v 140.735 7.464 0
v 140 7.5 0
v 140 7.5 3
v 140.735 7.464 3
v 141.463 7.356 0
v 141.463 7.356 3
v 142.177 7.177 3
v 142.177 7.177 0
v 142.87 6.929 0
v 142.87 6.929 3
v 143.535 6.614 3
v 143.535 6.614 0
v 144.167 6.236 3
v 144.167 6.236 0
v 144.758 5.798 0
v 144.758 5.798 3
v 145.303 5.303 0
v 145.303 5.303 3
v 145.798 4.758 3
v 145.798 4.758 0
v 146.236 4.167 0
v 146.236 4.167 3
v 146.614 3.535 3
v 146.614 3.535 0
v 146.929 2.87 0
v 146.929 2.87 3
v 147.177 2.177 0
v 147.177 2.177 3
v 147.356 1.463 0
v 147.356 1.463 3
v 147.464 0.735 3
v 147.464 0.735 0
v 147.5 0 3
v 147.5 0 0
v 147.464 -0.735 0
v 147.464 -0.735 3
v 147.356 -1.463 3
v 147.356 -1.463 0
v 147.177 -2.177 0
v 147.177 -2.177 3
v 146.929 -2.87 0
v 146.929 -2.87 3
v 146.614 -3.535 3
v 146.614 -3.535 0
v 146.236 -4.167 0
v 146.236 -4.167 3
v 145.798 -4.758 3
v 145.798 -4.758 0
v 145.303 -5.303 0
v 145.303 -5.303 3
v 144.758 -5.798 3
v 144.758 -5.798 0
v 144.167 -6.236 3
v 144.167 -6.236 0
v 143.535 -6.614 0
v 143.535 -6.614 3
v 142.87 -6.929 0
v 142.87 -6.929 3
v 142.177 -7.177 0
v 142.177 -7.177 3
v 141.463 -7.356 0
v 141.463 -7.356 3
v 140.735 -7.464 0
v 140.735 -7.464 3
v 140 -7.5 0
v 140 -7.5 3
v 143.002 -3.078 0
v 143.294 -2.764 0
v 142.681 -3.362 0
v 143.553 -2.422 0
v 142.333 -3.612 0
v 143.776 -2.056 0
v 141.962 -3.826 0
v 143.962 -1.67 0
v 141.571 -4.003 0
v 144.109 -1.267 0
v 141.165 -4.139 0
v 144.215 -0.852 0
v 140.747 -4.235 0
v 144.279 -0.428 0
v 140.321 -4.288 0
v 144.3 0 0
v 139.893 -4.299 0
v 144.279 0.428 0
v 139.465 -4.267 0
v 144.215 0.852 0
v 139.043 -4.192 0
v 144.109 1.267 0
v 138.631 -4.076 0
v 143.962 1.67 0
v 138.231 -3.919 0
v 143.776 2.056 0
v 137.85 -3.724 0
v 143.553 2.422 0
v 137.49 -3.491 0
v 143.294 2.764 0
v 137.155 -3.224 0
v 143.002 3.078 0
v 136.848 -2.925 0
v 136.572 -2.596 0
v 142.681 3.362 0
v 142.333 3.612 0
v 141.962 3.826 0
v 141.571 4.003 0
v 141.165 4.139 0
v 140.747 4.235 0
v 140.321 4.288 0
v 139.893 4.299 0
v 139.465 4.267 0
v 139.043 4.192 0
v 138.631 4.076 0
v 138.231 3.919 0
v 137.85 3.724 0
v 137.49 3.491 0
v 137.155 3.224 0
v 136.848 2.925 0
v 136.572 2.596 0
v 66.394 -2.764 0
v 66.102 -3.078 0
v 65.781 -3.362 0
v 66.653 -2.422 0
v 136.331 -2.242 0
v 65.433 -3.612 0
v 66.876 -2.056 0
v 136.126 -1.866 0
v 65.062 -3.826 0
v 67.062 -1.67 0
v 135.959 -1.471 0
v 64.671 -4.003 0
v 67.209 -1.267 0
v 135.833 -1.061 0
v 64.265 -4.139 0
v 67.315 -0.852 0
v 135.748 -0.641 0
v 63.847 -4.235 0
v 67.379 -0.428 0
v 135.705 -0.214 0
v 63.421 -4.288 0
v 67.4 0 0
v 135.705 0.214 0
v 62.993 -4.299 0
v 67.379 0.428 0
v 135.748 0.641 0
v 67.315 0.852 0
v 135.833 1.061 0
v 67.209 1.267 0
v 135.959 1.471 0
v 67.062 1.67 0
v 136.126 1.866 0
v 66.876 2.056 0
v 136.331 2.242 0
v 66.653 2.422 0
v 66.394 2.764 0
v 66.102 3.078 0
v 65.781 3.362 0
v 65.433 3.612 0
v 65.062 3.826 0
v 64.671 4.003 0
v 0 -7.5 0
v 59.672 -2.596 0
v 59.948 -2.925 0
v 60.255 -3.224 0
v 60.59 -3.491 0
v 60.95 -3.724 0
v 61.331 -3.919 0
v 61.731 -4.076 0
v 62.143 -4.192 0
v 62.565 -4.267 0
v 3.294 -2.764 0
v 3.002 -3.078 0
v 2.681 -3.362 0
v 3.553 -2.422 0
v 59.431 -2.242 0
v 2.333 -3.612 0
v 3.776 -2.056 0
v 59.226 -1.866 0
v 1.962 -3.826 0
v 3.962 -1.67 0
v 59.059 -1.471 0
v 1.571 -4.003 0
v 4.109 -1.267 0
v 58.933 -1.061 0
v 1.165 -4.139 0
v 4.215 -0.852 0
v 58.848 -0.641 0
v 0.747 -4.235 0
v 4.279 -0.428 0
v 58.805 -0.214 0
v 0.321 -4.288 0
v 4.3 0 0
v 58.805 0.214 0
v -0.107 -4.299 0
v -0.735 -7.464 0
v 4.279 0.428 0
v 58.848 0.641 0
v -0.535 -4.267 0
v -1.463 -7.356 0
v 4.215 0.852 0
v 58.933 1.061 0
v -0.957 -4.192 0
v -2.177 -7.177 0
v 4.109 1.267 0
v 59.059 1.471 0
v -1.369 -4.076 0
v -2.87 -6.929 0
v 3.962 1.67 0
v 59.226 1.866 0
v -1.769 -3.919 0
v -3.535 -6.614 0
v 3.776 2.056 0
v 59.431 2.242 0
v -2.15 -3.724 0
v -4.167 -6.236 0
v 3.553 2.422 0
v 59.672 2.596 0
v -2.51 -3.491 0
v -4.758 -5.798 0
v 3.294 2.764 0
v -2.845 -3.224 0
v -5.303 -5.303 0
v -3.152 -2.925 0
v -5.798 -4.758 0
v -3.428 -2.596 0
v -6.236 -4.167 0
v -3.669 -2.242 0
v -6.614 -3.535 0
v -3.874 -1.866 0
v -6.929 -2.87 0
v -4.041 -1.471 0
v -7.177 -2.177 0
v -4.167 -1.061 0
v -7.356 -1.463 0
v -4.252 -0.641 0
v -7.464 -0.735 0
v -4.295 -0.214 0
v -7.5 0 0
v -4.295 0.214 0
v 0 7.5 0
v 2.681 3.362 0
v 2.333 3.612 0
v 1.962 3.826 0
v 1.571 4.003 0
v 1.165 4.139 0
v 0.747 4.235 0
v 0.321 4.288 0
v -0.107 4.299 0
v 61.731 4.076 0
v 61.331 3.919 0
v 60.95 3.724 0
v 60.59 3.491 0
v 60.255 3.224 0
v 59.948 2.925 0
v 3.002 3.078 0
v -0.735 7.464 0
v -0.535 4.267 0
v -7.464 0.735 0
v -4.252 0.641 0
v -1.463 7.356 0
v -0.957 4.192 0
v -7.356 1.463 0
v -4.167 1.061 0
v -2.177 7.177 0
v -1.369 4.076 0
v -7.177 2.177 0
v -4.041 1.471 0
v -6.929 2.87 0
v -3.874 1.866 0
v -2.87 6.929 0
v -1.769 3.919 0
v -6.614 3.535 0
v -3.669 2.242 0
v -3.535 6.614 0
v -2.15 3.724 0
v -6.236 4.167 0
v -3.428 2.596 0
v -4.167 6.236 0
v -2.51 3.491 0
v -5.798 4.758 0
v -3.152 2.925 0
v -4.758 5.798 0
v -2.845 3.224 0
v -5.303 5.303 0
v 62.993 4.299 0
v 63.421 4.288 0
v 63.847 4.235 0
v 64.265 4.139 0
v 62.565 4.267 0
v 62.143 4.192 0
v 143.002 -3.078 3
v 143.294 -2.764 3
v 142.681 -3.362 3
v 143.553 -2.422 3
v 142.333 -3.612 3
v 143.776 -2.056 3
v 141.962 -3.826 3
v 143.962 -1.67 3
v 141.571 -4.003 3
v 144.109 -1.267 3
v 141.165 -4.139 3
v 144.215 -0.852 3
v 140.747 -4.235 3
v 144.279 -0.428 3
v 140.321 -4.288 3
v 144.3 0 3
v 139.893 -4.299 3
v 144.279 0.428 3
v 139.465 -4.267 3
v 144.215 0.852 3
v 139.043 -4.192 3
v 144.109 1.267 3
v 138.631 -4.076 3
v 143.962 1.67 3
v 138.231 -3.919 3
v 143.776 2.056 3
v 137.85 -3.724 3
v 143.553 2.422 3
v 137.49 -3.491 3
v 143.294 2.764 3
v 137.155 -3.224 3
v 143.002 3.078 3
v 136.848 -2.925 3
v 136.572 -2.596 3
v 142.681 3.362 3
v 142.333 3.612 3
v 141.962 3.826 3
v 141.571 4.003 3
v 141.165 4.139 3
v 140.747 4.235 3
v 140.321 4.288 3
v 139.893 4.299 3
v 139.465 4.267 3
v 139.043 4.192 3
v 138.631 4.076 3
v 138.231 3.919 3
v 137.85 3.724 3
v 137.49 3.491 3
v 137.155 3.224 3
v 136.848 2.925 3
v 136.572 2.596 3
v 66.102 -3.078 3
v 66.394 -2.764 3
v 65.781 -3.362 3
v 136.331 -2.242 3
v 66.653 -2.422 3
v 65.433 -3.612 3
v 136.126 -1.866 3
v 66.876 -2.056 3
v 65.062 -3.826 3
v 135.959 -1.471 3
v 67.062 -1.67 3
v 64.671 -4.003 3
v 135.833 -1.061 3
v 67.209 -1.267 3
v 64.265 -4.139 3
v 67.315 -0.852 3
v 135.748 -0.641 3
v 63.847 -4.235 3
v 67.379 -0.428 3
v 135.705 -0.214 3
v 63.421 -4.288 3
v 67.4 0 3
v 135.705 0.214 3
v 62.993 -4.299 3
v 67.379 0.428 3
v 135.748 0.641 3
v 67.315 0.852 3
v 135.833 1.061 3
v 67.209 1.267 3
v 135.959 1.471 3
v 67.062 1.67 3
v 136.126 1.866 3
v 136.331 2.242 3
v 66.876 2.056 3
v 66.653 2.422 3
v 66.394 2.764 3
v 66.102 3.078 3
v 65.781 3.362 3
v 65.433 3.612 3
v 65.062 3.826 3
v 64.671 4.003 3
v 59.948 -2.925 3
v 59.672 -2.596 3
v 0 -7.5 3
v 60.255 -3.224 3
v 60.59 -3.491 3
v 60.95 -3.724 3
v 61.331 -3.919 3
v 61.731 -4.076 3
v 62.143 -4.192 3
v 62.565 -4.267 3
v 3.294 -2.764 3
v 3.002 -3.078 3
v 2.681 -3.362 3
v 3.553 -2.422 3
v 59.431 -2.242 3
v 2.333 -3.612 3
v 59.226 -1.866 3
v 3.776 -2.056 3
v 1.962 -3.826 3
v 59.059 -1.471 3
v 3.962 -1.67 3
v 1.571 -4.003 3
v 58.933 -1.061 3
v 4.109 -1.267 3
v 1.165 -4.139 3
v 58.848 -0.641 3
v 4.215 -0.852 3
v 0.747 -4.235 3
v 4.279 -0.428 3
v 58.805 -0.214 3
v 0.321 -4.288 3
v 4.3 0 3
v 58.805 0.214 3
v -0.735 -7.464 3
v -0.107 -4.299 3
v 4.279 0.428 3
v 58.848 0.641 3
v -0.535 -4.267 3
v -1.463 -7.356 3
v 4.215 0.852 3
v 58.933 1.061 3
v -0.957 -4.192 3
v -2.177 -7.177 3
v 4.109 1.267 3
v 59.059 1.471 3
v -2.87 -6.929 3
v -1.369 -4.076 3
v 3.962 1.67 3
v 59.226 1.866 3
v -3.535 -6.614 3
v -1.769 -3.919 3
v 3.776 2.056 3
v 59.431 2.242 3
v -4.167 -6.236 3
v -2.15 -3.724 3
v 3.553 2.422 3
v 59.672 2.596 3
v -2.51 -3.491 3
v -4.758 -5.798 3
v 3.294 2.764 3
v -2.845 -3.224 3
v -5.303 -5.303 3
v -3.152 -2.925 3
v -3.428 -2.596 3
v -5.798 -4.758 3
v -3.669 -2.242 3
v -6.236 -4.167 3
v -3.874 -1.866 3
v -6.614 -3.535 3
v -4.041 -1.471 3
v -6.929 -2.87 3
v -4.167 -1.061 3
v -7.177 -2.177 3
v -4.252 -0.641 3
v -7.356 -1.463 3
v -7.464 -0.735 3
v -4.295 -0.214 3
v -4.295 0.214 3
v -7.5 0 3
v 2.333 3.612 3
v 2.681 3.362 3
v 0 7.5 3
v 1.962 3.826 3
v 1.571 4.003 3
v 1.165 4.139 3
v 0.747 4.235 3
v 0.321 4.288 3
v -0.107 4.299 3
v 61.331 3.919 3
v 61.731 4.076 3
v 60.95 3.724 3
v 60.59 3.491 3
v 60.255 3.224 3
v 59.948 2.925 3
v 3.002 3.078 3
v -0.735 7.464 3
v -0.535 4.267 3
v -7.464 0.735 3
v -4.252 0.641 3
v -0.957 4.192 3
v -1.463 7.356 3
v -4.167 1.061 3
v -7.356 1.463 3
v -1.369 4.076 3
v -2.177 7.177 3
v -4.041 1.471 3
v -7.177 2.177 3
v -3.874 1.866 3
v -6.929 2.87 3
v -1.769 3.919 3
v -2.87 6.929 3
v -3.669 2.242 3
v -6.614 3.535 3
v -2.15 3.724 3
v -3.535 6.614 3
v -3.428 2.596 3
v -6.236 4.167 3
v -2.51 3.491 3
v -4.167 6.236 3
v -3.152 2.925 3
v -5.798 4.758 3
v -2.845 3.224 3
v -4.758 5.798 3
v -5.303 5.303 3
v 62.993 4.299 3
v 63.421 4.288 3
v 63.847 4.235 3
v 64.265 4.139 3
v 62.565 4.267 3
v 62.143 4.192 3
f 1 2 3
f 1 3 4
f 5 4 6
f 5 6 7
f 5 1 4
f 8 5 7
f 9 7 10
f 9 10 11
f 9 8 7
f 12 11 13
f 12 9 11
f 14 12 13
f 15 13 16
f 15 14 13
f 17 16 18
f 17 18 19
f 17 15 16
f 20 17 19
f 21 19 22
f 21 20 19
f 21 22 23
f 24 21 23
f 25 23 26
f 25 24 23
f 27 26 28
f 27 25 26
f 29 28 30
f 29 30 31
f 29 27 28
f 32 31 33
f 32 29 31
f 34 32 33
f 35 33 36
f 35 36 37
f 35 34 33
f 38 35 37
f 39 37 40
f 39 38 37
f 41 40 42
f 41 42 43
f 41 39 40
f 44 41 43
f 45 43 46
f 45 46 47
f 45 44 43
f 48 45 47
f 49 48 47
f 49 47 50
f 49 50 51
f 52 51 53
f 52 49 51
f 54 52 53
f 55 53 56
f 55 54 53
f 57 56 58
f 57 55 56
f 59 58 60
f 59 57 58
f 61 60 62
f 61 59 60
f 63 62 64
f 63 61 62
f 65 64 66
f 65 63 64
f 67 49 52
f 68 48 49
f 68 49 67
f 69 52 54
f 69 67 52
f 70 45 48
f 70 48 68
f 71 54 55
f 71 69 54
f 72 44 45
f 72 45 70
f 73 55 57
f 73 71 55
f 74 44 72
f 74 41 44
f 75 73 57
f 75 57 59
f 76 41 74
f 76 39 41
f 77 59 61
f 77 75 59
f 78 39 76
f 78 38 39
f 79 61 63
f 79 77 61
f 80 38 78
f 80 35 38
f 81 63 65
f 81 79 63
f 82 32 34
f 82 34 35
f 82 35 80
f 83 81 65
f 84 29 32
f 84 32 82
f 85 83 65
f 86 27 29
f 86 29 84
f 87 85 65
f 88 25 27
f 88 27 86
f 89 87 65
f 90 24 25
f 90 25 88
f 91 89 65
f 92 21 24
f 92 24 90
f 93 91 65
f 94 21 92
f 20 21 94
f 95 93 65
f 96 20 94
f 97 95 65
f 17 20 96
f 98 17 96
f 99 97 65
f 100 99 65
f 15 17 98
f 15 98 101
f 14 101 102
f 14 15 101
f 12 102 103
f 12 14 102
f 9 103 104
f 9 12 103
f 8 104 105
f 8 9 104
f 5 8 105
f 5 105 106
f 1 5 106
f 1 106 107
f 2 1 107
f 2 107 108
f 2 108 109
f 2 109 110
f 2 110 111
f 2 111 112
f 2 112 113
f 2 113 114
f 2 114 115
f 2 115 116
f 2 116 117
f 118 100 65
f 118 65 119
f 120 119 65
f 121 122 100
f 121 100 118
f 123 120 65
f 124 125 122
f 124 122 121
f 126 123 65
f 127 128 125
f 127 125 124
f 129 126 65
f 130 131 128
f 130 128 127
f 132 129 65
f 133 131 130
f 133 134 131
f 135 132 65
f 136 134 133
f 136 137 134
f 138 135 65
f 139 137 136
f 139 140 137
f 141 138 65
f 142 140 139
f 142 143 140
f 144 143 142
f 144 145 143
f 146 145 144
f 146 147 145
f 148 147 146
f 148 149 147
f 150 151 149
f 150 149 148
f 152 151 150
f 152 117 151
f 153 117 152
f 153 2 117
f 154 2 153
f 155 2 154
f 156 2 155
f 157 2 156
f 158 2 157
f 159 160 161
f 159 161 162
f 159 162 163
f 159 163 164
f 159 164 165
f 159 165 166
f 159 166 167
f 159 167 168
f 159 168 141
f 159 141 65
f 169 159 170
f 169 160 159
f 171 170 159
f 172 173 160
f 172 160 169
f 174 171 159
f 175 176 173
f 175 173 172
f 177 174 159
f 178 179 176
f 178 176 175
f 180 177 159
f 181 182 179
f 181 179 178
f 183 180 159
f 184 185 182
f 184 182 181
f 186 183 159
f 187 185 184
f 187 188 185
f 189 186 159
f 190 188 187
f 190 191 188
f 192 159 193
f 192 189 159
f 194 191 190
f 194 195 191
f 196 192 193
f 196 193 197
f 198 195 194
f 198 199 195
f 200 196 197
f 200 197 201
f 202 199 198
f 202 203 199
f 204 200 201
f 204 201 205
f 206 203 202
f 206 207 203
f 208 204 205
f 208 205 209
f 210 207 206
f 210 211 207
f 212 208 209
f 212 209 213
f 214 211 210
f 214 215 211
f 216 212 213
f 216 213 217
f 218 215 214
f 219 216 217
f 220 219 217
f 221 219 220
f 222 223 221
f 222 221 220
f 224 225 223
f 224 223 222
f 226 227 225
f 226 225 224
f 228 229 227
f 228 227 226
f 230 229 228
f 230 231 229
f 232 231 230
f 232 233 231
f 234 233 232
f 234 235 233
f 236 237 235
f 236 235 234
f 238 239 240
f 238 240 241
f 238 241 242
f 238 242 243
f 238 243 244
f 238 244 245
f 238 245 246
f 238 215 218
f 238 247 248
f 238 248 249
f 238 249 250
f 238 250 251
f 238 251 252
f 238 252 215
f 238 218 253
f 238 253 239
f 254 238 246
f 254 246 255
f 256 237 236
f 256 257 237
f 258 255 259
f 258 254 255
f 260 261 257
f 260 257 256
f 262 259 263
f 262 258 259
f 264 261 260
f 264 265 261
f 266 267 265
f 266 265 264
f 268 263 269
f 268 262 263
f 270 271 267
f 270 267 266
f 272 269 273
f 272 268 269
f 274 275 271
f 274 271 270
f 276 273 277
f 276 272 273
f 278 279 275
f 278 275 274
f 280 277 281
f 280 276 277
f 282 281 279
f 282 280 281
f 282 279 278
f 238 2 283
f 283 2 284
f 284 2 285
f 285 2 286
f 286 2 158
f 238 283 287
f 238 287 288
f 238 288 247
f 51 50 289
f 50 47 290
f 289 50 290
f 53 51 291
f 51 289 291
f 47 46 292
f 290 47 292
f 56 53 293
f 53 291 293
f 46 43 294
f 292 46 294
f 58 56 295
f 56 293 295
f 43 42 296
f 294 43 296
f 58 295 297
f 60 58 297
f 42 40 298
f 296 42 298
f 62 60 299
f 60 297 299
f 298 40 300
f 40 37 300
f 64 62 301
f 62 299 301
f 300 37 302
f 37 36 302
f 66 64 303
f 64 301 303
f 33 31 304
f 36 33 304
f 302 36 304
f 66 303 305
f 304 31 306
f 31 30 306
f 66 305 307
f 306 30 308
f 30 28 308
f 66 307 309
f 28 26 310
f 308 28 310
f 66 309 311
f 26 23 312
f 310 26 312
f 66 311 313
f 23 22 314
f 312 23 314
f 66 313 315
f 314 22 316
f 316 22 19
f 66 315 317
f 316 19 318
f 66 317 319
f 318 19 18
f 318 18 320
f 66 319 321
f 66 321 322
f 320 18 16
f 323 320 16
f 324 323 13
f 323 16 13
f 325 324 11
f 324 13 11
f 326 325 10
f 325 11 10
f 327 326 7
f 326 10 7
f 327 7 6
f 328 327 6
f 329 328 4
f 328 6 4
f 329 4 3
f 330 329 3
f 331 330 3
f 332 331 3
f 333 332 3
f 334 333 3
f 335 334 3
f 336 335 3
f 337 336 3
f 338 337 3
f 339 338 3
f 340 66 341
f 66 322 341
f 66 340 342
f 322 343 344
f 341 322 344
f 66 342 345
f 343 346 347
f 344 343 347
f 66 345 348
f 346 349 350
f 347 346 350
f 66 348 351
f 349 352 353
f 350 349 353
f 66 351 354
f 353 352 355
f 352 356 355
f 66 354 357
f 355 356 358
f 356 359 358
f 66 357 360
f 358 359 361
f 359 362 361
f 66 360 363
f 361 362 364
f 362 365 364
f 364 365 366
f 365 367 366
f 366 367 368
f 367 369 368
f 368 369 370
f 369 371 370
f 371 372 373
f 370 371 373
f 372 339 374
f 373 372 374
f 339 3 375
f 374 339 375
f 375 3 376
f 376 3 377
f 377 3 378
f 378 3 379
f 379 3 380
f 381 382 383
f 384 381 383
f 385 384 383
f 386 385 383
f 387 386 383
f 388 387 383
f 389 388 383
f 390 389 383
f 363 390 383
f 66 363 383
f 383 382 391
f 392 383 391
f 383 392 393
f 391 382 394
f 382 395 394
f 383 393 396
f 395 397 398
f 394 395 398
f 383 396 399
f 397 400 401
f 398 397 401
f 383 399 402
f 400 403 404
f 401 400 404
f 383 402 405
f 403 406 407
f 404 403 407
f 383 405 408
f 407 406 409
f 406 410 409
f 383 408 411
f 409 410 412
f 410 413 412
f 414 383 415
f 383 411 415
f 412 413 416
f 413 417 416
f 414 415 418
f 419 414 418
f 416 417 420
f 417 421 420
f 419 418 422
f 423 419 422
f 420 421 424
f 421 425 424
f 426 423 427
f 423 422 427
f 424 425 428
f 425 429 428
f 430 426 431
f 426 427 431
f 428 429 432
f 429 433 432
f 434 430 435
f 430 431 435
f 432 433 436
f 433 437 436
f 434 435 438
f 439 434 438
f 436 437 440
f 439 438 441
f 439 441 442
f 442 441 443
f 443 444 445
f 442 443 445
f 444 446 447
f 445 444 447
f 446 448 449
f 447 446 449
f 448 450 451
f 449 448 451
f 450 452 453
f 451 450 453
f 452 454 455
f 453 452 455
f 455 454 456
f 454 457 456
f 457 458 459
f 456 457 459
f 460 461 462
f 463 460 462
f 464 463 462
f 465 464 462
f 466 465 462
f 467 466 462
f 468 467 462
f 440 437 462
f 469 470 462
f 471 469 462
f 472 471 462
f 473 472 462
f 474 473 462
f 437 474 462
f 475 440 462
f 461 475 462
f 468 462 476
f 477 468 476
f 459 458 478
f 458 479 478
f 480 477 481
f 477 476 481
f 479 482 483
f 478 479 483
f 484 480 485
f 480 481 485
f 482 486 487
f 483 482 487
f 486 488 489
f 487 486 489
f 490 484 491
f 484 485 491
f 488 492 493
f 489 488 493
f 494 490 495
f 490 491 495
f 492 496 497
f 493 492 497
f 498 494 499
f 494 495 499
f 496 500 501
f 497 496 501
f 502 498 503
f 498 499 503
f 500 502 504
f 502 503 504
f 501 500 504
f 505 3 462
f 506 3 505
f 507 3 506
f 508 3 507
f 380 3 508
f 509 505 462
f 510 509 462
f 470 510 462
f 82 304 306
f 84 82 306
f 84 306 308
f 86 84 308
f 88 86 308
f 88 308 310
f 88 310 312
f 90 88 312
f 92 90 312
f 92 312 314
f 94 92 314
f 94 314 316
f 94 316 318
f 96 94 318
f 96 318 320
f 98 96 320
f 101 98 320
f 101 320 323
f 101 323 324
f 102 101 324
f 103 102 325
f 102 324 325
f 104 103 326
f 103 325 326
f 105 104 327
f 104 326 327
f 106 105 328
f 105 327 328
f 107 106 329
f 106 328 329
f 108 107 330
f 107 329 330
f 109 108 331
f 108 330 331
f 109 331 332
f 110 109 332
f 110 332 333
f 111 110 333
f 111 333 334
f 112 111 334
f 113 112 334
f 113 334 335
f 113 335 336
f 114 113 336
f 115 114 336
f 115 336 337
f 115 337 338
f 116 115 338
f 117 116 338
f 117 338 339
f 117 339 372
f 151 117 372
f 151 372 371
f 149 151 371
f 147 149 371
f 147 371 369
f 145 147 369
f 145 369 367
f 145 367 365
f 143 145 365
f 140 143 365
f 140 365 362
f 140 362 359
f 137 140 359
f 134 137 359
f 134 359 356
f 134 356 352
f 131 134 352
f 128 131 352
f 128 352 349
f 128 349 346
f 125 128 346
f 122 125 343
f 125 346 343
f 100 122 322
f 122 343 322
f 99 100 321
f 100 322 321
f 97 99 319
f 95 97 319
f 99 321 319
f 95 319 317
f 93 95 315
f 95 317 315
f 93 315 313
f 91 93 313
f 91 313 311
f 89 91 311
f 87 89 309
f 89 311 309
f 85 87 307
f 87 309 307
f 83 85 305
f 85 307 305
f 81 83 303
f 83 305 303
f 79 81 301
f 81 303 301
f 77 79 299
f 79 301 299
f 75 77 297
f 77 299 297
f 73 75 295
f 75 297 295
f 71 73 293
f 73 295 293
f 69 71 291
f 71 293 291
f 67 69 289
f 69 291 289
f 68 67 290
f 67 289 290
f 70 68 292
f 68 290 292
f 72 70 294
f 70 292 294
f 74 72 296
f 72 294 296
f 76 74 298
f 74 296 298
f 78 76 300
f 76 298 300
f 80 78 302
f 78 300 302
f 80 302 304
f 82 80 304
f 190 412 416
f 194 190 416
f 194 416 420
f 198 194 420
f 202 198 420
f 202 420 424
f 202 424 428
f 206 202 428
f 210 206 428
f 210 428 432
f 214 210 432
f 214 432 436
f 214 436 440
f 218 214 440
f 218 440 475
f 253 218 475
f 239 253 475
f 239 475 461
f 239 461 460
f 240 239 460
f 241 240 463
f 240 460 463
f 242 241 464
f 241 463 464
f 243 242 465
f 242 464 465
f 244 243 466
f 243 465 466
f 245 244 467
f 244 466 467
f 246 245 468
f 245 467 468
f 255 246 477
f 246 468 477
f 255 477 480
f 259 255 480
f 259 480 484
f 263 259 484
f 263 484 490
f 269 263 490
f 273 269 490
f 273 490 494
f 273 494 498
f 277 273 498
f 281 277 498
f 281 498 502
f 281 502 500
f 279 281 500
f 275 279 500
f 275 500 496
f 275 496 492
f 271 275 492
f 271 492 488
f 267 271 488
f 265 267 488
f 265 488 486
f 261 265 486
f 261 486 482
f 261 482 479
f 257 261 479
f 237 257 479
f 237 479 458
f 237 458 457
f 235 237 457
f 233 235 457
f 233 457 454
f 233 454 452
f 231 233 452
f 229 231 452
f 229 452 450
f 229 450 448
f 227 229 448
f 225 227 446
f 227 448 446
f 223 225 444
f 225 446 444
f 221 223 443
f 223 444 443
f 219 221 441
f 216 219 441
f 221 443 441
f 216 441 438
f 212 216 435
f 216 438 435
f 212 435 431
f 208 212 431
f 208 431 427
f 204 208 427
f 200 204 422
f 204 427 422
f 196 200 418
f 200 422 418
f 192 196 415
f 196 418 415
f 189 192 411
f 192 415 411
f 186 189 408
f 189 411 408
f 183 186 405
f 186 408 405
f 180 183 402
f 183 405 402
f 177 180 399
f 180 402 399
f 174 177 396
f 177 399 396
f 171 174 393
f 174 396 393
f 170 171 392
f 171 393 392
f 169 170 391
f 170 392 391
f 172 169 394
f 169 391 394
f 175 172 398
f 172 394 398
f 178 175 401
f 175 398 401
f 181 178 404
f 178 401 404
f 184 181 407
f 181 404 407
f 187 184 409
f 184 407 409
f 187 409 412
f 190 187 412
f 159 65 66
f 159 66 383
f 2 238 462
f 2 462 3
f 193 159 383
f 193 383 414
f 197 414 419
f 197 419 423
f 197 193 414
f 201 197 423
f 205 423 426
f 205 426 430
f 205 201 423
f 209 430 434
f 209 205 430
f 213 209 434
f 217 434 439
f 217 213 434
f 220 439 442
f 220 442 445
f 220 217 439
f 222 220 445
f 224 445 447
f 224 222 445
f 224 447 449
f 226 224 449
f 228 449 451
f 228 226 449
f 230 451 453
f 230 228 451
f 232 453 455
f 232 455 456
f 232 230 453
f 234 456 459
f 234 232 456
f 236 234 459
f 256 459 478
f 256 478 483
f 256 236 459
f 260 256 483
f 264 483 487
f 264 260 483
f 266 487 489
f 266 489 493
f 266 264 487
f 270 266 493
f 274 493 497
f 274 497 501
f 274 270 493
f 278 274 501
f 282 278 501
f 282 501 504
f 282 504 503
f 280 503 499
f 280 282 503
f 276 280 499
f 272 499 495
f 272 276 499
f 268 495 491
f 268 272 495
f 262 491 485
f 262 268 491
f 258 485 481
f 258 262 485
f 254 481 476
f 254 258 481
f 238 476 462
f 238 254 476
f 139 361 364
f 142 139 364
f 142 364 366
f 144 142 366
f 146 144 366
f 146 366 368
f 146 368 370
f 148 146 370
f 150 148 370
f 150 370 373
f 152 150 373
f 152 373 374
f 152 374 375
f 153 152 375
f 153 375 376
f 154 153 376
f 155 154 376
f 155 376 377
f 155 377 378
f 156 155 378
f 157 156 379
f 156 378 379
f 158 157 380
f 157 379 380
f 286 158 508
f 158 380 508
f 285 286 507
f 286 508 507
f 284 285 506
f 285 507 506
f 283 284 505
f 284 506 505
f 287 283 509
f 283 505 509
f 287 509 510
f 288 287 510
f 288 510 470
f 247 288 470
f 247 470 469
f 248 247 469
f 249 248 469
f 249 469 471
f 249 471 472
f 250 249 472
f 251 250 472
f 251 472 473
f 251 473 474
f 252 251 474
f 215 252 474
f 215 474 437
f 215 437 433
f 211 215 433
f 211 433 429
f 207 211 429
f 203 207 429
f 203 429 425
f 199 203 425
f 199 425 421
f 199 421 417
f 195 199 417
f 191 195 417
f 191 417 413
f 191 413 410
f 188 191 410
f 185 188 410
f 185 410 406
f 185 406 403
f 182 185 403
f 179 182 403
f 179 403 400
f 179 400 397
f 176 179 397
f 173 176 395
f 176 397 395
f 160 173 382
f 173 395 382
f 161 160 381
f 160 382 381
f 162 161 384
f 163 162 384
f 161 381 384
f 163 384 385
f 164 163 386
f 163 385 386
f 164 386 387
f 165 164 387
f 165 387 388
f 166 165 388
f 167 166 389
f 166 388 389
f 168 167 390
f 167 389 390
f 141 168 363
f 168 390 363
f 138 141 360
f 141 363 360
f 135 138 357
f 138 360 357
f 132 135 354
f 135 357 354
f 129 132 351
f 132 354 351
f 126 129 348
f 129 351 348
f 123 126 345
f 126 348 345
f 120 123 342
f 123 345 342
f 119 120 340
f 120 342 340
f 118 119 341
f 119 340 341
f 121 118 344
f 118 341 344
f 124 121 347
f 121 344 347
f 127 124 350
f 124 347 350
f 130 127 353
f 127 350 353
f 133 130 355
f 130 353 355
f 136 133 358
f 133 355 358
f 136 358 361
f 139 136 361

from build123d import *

# Parameters (mm, degrees)
BOSS_EXTRUDE1_DEPTH = 3
SKETCH2_R           = 4.3
CUT_EXTRUDE1_DEPTH  = 148.721020847


with BuildPart() as part:
    # Sketch1 → Boss-Extrude1 (new body)
    with BuildSketch(Plane.XY):
        with BuildLine():
            Line((0, 7.5), (140, 7.5))
            ThreePointArc((140, 7.5), (147.5, 0), (140, -7.5))
            Line((140, -7.5), (0, -7.5))
            ThreePointArc((0, -7.5), (-7.5, 0), (0, 7.5))
        make_face()
    extrude(amount=BOSS_EXTRUDE1_DEPTH)

    # Sketch2 → Cut-Extrude1 (cut, through all)
    with BuildSketch(Plane.XY.offset(3)):
        Circle(SKETCH2_R)
        with Locations((140, 0)):
            Circle(SKETCH2_R)
        with Locations((63.1, 0)):
            Circle(SKETCH2_R)
    extrude(amount=-CUT_EXTRUDE1_DEPTH, mode=Mode.SUBTRACT)


solid = part.part
